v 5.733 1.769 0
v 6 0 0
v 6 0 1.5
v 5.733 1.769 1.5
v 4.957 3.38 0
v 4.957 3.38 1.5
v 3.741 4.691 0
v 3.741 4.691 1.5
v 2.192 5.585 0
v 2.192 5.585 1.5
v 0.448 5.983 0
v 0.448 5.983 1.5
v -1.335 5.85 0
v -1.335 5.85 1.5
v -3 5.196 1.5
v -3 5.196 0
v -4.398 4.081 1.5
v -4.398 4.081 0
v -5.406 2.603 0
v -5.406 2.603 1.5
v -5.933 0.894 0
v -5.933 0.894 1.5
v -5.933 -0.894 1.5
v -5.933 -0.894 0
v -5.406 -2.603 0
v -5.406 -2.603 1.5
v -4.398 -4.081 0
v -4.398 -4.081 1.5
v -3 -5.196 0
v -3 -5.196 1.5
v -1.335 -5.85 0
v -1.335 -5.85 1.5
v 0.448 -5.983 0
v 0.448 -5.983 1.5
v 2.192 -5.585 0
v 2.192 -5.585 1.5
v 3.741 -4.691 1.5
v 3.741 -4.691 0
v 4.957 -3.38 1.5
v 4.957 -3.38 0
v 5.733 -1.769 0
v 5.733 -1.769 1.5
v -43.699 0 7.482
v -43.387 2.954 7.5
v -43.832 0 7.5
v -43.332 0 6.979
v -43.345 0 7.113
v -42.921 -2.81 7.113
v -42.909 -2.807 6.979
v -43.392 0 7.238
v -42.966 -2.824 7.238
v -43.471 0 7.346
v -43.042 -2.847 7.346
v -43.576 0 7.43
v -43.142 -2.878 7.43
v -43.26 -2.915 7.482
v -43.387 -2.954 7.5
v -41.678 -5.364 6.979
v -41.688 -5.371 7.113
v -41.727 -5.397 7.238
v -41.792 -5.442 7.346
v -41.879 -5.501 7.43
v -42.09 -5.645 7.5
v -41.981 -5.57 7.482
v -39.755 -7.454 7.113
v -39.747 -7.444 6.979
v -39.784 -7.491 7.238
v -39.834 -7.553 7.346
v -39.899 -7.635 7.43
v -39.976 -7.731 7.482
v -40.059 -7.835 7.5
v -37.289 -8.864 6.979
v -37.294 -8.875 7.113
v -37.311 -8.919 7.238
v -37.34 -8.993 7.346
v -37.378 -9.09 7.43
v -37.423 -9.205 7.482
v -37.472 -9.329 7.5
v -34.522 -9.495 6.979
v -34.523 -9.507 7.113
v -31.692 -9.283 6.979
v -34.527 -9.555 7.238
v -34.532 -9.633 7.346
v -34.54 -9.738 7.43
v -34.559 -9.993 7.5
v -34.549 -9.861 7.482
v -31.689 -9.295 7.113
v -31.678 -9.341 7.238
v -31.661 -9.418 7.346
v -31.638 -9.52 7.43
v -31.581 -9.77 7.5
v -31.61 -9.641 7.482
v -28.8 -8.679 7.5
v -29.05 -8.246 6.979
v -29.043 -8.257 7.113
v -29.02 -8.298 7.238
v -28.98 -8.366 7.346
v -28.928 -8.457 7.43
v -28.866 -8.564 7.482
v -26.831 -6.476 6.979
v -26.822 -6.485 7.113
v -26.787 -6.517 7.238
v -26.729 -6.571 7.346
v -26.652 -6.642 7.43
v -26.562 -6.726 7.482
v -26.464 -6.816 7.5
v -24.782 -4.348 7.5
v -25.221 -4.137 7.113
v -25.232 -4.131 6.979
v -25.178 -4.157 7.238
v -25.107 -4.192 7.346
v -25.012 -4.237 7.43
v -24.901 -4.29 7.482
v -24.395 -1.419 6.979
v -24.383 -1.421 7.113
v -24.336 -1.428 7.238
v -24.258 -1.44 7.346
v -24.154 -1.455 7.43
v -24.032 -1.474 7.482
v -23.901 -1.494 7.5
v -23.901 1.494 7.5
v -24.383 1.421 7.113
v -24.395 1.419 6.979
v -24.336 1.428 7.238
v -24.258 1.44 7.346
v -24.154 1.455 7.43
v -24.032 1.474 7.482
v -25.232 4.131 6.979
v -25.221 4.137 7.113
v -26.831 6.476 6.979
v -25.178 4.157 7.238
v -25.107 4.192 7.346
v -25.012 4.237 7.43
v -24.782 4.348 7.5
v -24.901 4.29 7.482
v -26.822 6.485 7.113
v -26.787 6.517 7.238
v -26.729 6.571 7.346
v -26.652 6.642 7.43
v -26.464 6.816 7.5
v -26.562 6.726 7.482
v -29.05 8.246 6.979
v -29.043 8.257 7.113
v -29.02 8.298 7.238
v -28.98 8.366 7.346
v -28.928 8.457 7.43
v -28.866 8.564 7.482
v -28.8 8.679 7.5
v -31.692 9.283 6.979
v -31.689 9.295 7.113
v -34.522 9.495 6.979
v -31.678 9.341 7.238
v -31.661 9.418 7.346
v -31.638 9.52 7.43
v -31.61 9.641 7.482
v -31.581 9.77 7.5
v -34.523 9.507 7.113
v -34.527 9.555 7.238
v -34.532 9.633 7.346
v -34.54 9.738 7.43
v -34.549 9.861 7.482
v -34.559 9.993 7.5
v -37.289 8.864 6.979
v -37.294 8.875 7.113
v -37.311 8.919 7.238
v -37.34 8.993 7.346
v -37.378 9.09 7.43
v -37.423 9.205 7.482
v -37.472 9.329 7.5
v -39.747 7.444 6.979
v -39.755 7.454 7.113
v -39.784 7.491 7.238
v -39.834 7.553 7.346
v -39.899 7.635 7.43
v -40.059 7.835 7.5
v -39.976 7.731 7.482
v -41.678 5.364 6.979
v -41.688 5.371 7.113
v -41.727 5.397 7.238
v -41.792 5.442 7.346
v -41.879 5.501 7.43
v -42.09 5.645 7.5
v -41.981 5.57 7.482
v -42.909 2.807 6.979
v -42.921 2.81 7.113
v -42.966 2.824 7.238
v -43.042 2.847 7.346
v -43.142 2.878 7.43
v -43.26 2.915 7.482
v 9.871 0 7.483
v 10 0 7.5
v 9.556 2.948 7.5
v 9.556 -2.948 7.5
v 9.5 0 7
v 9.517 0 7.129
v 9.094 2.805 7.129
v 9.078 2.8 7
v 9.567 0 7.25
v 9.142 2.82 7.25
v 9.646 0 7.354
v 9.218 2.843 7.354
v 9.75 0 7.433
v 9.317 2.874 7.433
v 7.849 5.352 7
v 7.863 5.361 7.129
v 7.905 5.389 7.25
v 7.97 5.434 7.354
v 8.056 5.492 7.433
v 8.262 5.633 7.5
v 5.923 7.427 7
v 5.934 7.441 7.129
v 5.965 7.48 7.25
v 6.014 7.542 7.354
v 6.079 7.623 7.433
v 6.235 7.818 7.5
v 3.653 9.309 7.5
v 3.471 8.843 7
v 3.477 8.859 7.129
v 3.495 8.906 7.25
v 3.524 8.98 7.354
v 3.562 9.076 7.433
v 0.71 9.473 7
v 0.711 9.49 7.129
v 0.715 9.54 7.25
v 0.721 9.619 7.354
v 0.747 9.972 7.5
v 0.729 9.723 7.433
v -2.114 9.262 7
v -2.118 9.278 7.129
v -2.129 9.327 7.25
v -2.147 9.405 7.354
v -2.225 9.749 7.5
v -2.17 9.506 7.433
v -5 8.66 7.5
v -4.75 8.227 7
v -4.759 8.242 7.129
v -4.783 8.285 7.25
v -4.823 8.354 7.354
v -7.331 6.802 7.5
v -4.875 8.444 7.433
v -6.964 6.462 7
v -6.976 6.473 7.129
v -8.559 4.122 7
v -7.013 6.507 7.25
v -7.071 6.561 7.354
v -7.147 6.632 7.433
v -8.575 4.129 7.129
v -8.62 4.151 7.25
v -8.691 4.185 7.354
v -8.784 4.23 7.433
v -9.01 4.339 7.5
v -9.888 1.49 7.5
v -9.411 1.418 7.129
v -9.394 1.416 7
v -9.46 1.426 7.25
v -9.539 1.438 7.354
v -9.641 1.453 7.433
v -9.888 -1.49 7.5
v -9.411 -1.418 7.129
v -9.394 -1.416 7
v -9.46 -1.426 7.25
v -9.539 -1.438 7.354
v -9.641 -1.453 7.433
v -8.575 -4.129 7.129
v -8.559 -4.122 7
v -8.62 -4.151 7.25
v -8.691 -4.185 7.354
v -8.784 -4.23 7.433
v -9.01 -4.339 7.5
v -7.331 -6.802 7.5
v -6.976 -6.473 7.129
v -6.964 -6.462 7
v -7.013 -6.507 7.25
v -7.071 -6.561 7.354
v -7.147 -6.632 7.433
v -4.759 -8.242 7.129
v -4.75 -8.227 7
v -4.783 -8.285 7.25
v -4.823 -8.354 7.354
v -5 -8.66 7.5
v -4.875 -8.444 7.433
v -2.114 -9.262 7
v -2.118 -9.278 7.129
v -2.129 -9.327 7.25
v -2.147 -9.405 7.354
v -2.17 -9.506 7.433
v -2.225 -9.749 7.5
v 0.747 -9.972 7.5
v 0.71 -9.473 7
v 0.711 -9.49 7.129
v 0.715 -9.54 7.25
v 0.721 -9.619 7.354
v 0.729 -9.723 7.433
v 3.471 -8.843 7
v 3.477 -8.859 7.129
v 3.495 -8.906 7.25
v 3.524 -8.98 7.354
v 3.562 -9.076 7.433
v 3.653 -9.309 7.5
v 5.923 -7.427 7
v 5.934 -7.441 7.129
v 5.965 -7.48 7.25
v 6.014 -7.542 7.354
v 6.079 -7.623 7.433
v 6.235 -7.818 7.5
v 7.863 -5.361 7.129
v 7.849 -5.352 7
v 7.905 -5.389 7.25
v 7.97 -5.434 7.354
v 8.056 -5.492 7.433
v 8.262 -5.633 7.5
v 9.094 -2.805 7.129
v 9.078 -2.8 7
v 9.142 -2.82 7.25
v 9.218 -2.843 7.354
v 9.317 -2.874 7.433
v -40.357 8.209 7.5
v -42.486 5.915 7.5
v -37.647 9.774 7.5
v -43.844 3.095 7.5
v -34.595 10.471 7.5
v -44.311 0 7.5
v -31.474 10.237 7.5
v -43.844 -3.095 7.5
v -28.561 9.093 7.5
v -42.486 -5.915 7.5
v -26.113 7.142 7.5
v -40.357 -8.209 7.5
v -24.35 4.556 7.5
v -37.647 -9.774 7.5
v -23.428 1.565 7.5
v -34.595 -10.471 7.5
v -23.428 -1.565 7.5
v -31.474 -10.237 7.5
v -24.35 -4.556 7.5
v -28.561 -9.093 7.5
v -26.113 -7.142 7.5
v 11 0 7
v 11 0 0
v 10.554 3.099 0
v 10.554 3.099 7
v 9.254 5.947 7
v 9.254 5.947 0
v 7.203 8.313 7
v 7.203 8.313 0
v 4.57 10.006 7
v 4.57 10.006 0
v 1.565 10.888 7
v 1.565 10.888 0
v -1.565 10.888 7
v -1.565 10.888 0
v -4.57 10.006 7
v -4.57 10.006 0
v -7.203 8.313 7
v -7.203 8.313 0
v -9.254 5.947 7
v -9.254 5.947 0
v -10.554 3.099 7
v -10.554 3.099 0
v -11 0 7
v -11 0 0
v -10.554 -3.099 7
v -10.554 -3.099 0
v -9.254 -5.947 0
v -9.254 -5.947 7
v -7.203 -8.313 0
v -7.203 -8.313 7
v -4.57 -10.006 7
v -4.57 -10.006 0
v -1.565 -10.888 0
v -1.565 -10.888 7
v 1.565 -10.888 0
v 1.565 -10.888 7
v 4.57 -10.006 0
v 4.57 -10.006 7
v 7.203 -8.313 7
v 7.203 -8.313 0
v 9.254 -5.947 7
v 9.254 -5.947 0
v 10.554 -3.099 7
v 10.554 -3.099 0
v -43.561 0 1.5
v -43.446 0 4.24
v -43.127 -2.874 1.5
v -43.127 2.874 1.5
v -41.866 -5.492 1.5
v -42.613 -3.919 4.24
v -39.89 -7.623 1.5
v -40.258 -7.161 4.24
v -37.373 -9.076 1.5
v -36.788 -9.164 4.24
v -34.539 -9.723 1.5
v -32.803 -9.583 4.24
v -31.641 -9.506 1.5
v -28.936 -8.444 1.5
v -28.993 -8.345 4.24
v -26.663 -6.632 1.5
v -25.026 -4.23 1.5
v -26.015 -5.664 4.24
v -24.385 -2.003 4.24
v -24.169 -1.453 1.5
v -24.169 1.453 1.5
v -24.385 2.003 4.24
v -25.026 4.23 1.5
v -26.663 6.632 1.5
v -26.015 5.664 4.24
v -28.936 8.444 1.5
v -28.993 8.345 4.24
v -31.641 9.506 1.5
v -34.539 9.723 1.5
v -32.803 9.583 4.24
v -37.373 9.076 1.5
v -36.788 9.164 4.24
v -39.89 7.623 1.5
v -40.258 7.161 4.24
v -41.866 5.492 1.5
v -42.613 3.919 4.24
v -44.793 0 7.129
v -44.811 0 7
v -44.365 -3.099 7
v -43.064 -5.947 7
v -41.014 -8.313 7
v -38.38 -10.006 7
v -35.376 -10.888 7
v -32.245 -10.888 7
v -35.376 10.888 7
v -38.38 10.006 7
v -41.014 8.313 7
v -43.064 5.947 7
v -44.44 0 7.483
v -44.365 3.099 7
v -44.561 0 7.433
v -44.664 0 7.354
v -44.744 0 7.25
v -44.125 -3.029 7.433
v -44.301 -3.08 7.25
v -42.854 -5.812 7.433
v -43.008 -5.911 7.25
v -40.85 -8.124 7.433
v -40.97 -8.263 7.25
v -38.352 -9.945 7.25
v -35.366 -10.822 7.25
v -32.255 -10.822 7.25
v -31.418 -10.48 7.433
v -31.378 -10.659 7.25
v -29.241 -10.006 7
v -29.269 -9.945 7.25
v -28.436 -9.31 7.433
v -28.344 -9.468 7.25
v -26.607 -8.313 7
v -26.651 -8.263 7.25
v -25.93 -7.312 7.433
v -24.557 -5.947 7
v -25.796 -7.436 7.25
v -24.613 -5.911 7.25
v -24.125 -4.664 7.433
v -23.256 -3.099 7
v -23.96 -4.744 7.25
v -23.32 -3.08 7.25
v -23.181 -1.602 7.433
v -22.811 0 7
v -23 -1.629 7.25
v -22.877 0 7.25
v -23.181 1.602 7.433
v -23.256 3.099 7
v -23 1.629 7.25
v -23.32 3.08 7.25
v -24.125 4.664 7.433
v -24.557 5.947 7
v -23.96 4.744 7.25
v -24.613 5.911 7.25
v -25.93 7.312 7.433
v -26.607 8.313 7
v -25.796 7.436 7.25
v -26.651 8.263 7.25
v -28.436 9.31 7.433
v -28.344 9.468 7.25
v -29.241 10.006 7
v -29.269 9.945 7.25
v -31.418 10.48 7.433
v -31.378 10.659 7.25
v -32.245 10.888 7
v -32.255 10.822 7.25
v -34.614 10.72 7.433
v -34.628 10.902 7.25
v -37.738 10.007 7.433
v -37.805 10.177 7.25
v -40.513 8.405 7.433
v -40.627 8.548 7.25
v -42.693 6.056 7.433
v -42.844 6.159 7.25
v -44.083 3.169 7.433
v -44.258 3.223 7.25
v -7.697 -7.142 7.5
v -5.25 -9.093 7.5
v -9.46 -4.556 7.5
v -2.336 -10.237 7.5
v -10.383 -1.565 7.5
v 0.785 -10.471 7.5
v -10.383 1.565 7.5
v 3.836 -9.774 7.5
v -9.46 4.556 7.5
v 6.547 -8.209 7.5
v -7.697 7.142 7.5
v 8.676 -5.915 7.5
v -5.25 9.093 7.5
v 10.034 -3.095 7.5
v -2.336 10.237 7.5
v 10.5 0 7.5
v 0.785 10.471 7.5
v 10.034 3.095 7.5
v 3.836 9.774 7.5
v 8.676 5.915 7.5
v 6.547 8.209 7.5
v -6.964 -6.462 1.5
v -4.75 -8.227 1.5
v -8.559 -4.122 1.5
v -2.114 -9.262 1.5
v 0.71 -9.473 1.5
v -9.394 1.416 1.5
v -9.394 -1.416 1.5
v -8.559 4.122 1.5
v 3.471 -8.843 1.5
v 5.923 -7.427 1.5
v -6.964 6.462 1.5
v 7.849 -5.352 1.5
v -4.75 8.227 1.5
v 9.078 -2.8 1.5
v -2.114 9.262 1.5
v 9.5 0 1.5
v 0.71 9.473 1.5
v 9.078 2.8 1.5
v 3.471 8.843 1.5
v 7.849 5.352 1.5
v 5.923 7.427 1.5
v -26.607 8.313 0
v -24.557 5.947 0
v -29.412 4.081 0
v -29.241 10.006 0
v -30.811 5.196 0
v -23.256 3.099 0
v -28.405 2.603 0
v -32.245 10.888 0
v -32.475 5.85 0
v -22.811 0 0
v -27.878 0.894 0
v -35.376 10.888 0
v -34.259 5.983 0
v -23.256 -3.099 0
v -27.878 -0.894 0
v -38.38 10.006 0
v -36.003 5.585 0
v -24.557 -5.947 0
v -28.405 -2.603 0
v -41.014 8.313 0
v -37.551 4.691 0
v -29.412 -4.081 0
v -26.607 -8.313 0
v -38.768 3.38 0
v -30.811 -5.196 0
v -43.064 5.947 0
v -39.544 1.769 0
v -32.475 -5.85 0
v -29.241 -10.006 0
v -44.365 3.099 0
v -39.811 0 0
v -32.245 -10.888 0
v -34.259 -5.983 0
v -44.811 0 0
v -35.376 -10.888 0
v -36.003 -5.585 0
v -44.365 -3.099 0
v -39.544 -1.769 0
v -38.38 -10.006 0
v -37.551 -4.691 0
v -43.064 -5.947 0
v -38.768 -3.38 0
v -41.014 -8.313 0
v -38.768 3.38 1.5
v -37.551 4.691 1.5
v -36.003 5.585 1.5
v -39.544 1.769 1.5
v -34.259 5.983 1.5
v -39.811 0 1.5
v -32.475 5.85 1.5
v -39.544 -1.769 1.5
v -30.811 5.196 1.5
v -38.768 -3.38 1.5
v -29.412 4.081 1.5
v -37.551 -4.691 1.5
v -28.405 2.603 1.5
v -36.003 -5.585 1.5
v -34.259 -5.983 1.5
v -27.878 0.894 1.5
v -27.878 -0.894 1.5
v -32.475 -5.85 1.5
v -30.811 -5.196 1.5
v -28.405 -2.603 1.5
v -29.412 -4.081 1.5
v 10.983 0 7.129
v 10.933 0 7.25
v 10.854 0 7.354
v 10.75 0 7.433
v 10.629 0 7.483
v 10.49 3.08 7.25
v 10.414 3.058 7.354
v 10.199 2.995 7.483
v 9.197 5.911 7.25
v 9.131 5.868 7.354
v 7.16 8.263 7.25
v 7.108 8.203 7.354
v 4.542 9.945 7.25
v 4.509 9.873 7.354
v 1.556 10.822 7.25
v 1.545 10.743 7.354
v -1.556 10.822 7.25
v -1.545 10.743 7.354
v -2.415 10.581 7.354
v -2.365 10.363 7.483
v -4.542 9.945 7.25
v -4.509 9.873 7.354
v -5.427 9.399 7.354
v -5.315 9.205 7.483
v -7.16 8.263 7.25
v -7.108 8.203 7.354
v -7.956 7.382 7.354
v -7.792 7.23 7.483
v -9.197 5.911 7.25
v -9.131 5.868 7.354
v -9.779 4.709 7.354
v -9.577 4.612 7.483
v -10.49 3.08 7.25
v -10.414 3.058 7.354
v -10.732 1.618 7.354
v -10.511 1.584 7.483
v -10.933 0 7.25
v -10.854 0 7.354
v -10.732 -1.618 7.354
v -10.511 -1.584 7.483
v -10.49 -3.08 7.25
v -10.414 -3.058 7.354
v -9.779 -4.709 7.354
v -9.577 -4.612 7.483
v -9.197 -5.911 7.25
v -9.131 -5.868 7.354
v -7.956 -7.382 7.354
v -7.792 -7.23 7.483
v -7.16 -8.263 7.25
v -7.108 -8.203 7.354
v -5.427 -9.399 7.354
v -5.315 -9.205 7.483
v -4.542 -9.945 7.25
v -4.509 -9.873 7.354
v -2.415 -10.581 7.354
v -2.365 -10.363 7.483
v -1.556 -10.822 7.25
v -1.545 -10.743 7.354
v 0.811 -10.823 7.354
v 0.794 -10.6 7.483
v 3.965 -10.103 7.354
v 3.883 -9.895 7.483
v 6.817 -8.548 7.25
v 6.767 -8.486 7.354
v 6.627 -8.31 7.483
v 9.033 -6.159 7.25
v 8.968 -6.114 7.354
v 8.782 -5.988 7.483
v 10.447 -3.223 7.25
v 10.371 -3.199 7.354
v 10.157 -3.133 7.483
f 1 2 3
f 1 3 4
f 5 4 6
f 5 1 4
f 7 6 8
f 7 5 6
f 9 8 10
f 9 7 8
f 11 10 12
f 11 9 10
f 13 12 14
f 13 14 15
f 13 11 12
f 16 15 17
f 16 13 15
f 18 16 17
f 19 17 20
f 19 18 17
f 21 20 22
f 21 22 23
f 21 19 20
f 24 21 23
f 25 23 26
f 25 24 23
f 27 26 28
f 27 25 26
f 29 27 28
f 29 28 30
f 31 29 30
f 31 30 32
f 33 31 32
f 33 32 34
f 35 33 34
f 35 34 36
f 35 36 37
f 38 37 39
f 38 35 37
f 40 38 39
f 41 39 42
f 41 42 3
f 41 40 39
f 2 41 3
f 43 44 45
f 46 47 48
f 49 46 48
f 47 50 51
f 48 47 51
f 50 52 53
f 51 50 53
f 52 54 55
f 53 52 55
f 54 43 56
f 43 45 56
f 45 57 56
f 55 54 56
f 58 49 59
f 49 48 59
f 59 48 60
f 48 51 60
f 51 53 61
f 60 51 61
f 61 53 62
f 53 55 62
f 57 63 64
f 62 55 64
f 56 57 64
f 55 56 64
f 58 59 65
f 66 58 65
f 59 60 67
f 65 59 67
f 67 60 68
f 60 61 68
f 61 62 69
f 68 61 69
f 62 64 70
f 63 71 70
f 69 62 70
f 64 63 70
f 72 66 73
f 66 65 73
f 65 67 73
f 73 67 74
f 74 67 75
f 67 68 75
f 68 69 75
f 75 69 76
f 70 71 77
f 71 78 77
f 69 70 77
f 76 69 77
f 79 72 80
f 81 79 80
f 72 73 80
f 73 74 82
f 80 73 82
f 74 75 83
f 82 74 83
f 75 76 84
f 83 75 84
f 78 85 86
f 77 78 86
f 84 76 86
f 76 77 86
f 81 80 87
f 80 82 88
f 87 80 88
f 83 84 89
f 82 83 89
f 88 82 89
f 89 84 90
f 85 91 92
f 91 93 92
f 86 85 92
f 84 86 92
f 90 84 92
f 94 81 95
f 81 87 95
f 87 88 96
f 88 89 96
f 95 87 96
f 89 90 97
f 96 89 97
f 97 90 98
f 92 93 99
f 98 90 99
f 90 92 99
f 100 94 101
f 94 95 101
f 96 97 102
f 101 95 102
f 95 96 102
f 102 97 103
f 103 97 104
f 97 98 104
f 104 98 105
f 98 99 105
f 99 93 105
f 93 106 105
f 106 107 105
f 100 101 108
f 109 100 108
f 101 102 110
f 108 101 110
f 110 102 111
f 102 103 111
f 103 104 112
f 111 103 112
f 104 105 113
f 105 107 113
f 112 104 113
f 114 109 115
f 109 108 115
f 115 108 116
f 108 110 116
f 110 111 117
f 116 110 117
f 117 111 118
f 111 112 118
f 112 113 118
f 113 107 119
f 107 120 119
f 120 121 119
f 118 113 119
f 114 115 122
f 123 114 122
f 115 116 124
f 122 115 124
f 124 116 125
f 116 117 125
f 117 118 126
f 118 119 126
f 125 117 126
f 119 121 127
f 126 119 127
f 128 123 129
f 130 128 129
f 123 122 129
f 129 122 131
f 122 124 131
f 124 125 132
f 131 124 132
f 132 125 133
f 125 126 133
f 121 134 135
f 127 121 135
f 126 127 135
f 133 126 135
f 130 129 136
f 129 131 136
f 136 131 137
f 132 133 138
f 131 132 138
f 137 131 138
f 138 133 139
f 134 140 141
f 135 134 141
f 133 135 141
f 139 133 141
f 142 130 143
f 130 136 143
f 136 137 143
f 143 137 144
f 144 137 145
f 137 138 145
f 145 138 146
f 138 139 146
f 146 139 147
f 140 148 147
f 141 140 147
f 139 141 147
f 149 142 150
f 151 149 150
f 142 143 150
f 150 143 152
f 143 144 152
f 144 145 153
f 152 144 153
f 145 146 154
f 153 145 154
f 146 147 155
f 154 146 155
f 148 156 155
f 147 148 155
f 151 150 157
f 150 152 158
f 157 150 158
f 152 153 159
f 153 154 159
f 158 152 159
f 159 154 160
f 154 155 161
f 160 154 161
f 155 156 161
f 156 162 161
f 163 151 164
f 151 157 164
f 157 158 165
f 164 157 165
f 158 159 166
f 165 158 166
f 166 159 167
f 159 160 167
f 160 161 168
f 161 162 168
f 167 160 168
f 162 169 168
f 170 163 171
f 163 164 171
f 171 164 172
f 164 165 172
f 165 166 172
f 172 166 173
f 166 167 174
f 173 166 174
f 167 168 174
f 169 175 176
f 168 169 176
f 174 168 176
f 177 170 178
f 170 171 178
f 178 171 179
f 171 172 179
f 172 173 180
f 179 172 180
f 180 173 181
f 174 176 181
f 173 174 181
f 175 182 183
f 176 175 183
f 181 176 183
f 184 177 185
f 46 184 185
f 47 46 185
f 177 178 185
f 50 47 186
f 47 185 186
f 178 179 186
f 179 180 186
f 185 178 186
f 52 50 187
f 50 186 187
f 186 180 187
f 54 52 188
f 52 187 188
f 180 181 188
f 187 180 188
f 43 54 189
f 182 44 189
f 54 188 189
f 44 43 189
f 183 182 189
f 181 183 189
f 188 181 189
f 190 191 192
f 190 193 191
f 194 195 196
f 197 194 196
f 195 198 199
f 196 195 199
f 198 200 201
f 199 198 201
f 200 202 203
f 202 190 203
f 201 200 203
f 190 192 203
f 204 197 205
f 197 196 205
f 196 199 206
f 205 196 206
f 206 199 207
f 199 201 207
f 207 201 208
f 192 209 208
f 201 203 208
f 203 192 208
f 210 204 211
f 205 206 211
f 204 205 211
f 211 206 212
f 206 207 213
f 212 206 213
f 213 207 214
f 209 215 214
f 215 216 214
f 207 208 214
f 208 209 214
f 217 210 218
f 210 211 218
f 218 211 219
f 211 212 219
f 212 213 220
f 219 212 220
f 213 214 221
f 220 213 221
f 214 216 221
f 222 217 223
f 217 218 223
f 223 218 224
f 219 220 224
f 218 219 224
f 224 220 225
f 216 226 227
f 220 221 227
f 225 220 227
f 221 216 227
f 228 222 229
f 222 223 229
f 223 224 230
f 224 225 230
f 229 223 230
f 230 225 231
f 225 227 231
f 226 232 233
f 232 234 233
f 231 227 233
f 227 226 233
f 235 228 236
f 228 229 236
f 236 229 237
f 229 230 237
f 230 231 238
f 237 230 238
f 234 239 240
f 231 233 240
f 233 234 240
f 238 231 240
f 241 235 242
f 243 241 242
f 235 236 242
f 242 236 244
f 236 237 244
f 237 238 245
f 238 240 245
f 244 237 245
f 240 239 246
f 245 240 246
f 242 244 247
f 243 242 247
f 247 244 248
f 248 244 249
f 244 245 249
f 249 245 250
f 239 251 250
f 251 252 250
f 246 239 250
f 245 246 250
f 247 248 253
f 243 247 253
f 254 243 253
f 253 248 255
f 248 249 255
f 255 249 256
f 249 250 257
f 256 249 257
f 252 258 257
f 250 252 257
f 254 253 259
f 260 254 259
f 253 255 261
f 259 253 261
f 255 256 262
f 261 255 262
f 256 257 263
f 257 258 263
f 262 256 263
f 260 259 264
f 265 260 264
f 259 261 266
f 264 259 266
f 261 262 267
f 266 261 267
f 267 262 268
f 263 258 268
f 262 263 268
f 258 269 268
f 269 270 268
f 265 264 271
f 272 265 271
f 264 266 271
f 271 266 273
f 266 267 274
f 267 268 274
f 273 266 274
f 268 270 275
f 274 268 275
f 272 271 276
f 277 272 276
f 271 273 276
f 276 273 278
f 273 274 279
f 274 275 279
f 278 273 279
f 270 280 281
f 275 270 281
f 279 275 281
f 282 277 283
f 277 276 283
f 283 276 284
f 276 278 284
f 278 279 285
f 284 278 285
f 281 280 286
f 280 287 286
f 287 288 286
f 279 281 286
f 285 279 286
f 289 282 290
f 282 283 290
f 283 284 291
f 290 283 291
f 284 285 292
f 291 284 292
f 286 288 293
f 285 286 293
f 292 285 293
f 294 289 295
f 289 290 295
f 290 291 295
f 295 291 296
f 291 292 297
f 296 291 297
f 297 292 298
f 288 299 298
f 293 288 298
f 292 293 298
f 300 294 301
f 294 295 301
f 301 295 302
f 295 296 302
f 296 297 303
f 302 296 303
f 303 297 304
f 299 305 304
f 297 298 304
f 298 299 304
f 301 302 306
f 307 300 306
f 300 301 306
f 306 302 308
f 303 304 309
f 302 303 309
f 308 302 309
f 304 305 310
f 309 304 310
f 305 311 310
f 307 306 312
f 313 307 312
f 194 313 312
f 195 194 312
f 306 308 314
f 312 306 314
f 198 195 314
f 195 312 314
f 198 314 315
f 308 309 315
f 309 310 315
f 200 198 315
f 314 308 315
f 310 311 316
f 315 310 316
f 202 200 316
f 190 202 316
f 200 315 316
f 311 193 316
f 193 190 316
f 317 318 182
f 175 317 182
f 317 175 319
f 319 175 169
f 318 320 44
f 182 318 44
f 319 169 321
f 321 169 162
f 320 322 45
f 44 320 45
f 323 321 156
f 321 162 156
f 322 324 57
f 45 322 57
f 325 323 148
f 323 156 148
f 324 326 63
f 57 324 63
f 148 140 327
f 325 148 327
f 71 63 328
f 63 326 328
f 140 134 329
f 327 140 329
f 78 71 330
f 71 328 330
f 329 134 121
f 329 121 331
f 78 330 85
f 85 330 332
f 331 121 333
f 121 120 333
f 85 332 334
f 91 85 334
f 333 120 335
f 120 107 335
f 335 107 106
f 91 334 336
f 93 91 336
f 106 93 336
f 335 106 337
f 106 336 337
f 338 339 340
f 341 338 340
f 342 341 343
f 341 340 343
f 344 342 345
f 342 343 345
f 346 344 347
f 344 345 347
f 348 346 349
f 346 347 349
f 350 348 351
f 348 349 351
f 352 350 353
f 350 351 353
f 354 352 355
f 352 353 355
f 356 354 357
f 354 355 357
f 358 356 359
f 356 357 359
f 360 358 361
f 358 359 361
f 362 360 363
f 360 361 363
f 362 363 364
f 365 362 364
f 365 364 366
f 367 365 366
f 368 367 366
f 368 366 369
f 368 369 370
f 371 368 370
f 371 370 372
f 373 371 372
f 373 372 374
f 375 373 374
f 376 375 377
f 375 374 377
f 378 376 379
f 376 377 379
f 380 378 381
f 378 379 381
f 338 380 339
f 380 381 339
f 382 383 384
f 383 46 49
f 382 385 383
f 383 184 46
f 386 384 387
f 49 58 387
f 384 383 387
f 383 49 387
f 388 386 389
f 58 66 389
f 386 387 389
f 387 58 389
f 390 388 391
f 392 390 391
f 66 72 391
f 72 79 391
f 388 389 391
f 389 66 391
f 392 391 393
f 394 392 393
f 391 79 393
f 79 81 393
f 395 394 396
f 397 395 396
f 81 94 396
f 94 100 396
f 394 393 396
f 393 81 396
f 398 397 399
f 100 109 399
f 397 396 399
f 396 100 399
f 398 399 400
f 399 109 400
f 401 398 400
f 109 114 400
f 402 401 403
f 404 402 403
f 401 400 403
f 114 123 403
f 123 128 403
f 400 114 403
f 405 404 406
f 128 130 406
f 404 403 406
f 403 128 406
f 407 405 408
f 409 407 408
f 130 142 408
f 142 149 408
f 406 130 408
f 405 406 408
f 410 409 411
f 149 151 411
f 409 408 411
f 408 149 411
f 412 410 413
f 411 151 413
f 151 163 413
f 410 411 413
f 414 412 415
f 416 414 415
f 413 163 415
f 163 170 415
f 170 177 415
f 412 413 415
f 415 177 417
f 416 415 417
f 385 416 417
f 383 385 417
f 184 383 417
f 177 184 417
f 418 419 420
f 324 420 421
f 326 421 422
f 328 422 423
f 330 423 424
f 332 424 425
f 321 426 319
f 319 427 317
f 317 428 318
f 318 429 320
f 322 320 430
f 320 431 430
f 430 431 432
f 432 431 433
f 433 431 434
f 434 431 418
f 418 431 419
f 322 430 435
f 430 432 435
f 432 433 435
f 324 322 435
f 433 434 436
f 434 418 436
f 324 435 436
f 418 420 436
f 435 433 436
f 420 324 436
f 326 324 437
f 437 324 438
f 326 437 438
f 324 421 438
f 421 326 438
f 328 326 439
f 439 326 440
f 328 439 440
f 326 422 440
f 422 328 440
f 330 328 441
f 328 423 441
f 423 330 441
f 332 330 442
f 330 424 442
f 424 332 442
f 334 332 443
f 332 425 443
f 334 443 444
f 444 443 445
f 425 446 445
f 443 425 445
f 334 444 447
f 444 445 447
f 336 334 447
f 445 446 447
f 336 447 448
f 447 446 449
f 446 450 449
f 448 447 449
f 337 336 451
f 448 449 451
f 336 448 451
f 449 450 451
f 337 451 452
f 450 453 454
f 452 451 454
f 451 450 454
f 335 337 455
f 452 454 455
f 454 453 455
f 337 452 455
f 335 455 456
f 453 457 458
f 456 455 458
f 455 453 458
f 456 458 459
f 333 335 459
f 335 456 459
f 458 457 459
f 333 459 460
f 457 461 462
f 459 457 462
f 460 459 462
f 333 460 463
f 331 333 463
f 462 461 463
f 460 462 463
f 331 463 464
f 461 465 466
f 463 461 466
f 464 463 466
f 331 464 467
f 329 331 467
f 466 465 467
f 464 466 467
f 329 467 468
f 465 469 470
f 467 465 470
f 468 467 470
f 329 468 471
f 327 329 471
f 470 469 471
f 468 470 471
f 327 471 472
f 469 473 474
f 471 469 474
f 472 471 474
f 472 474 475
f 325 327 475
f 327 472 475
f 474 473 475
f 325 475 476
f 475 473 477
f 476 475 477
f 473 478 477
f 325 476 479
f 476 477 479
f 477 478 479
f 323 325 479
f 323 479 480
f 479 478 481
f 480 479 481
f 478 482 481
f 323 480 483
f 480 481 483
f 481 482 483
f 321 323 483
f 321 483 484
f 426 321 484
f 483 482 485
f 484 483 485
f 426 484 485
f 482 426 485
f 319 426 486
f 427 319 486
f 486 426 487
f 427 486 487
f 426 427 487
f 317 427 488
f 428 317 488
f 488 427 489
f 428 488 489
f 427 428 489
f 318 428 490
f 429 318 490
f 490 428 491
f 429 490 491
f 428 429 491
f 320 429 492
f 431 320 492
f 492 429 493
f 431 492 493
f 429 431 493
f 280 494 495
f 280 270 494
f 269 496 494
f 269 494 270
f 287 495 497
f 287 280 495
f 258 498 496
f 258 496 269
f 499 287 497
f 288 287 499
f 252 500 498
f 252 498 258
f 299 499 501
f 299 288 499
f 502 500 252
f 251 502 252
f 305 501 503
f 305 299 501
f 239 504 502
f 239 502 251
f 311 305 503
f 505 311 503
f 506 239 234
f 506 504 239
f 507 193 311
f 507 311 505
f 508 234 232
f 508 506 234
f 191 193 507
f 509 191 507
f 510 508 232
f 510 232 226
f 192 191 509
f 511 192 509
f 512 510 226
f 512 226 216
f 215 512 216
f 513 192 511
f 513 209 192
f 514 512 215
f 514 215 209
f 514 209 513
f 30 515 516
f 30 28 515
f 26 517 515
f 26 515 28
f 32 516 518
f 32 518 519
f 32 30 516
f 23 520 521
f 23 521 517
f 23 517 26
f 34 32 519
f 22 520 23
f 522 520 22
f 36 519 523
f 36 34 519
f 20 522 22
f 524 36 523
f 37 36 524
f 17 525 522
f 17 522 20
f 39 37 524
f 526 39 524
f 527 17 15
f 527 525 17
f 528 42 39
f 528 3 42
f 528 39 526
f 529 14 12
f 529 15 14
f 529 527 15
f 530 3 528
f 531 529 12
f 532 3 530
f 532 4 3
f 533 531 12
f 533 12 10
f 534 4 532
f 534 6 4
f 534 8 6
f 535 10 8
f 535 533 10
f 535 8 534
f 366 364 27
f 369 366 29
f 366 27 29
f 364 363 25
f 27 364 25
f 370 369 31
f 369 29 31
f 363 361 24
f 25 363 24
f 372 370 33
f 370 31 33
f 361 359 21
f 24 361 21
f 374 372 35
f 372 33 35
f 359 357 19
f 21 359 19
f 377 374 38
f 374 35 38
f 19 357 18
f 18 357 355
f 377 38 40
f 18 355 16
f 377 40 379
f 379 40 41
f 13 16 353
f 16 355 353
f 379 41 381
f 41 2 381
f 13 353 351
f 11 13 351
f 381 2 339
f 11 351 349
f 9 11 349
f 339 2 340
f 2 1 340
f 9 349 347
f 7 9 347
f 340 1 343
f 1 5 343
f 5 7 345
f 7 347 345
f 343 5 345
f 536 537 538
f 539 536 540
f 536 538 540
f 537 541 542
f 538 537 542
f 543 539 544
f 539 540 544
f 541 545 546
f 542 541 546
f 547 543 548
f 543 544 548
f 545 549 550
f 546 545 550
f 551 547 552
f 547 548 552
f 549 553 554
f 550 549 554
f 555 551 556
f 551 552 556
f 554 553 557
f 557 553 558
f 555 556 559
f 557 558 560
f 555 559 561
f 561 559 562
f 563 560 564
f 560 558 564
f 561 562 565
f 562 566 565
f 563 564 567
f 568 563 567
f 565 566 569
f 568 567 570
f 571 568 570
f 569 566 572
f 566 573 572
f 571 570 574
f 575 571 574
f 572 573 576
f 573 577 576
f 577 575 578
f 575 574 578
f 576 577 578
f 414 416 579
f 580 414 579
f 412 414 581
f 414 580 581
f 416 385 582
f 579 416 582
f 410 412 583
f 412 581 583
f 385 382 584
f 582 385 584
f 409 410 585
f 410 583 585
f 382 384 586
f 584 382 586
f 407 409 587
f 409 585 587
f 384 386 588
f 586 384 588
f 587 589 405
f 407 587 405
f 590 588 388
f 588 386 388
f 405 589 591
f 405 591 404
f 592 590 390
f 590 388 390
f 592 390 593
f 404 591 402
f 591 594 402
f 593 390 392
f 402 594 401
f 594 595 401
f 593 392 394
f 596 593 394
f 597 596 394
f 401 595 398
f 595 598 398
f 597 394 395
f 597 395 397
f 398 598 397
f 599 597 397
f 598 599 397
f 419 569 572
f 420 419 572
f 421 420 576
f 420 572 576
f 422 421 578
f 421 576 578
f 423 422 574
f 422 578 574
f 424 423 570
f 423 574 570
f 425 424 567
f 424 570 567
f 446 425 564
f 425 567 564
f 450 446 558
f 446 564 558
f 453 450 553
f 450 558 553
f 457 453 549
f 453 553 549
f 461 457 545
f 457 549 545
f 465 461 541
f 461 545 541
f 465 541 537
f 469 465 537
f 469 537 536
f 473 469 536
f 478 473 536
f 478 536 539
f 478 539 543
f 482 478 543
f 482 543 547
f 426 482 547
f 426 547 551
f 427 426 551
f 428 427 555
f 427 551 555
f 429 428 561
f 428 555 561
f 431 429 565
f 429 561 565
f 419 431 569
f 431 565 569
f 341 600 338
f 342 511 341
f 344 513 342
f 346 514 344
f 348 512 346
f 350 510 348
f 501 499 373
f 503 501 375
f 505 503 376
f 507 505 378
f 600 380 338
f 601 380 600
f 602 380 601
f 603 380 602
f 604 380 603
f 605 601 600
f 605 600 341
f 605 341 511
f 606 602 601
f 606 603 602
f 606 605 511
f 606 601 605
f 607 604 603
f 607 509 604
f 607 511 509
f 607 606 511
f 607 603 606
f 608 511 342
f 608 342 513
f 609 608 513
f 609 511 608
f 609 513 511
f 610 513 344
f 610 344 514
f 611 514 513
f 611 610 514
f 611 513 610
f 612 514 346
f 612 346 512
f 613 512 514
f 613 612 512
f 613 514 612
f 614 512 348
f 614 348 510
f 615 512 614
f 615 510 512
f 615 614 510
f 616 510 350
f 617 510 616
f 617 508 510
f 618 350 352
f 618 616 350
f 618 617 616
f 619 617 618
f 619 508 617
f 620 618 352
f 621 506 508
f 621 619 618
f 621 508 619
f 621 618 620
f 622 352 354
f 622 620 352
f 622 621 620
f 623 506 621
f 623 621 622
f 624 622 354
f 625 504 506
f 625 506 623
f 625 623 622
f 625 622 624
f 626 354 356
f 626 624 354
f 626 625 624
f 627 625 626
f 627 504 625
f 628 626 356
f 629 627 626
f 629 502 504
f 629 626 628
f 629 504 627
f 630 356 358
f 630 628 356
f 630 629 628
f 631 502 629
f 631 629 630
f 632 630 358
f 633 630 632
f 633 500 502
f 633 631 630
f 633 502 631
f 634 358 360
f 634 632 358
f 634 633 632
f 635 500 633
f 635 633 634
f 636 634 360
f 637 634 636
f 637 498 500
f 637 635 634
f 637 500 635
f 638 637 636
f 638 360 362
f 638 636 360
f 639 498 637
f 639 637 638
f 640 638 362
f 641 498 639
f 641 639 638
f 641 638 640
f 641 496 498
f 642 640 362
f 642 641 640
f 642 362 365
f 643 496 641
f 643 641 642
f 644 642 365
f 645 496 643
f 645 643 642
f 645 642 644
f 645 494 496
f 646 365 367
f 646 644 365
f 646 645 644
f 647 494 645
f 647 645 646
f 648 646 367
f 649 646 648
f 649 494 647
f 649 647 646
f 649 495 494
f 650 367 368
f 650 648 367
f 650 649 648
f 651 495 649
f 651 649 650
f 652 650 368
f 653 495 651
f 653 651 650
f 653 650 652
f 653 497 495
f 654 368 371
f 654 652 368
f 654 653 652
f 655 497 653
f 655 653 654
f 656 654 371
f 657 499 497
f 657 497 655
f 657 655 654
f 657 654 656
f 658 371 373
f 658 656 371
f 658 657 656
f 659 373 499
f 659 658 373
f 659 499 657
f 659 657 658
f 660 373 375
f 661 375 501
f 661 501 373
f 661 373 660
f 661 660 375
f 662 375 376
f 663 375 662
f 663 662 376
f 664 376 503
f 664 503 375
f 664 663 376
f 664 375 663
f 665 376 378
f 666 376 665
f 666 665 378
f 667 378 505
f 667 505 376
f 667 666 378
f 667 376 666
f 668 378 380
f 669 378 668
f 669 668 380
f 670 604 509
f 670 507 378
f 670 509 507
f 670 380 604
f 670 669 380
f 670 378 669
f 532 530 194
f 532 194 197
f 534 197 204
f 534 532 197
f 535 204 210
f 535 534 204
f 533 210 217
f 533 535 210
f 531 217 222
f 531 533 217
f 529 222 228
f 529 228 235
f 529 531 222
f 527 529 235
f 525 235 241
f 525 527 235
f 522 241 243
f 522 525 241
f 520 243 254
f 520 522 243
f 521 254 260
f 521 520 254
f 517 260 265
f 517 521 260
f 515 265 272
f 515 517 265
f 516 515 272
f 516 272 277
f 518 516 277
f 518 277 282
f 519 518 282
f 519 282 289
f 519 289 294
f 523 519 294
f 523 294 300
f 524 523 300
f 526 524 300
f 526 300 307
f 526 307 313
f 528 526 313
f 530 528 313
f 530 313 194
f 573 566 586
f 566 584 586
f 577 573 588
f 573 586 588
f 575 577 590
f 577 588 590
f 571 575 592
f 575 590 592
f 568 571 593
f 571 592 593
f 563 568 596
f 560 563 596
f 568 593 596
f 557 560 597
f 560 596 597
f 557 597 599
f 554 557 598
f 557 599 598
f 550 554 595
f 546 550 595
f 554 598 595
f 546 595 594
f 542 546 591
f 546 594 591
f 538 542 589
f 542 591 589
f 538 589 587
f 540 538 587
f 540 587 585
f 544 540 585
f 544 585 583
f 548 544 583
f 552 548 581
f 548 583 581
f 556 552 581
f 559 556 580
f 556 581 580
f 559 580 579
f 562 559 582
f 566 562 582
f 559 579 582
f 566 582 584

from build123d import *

# Parameters (mm, degrees)
F0_R     = 11
F0_R_2   = 9.5
F1_DEPTH = 7.5
F0_R_3   = 6
F2_DEPTH = 1.5
F3_R     = 0.5
F6_R     = 0.5


with BuildPart() as f1:
    # F0 (on Top) → F1 (new body)
    with BuildSketch(Plane.XY):
        Circle(F0_R)
        Circle(F0_R_2, mode=Mode.SUBTRACT)
    extrude(amount=F1_DEPTH)

    # F0 (on Top) → F2 (join)
    with BuildSketch(Plane.XY):
        Circle(F0_R_2)
        Circle(F0_R_3, mode=Mode.SUBTRACT)
    extrude(amount=F2_DEPTH)

    # F3
    f3_edges = [f1.edges().sort_by_distance(p)[0] for p in [
        (-11, 0, 7.5),
        (-9.5, 0, 7.5),
    ]]
    fillet(f3_edges, radius=F3_R)


with BuildPart() as f5:
    # F4 (on Front) → F5 (revolve)
    with BuildSketch(Plane.XZ):
        Polygon((-44.8105111718, 1.5), (-43.5605111718, 1.5), (-43.3105111718, 7.5), (-44.8105111718, 7.5), align=None)
        Polygon((-39.8105111718, 0), (-39.8105111718, 1.5), (-43.5605111718, 1.5), (-44.8105111718, 1.5), (-44.8105111718, 0), align=None)
    revolve(axis=Axis((-33.8105111718, 0, 3.75), (0, 0, 1)))

    # F6
    f6_edges = [f5.edges().sort_by_distance(p)[0] for p in [
        (-22.810511, 0, 7.5),
        (-24.310511, 0, 7.5),
    ]]
    fillet(f6_edges, radius=F6_R)


solid = Compound([f1.part, f5.part])
